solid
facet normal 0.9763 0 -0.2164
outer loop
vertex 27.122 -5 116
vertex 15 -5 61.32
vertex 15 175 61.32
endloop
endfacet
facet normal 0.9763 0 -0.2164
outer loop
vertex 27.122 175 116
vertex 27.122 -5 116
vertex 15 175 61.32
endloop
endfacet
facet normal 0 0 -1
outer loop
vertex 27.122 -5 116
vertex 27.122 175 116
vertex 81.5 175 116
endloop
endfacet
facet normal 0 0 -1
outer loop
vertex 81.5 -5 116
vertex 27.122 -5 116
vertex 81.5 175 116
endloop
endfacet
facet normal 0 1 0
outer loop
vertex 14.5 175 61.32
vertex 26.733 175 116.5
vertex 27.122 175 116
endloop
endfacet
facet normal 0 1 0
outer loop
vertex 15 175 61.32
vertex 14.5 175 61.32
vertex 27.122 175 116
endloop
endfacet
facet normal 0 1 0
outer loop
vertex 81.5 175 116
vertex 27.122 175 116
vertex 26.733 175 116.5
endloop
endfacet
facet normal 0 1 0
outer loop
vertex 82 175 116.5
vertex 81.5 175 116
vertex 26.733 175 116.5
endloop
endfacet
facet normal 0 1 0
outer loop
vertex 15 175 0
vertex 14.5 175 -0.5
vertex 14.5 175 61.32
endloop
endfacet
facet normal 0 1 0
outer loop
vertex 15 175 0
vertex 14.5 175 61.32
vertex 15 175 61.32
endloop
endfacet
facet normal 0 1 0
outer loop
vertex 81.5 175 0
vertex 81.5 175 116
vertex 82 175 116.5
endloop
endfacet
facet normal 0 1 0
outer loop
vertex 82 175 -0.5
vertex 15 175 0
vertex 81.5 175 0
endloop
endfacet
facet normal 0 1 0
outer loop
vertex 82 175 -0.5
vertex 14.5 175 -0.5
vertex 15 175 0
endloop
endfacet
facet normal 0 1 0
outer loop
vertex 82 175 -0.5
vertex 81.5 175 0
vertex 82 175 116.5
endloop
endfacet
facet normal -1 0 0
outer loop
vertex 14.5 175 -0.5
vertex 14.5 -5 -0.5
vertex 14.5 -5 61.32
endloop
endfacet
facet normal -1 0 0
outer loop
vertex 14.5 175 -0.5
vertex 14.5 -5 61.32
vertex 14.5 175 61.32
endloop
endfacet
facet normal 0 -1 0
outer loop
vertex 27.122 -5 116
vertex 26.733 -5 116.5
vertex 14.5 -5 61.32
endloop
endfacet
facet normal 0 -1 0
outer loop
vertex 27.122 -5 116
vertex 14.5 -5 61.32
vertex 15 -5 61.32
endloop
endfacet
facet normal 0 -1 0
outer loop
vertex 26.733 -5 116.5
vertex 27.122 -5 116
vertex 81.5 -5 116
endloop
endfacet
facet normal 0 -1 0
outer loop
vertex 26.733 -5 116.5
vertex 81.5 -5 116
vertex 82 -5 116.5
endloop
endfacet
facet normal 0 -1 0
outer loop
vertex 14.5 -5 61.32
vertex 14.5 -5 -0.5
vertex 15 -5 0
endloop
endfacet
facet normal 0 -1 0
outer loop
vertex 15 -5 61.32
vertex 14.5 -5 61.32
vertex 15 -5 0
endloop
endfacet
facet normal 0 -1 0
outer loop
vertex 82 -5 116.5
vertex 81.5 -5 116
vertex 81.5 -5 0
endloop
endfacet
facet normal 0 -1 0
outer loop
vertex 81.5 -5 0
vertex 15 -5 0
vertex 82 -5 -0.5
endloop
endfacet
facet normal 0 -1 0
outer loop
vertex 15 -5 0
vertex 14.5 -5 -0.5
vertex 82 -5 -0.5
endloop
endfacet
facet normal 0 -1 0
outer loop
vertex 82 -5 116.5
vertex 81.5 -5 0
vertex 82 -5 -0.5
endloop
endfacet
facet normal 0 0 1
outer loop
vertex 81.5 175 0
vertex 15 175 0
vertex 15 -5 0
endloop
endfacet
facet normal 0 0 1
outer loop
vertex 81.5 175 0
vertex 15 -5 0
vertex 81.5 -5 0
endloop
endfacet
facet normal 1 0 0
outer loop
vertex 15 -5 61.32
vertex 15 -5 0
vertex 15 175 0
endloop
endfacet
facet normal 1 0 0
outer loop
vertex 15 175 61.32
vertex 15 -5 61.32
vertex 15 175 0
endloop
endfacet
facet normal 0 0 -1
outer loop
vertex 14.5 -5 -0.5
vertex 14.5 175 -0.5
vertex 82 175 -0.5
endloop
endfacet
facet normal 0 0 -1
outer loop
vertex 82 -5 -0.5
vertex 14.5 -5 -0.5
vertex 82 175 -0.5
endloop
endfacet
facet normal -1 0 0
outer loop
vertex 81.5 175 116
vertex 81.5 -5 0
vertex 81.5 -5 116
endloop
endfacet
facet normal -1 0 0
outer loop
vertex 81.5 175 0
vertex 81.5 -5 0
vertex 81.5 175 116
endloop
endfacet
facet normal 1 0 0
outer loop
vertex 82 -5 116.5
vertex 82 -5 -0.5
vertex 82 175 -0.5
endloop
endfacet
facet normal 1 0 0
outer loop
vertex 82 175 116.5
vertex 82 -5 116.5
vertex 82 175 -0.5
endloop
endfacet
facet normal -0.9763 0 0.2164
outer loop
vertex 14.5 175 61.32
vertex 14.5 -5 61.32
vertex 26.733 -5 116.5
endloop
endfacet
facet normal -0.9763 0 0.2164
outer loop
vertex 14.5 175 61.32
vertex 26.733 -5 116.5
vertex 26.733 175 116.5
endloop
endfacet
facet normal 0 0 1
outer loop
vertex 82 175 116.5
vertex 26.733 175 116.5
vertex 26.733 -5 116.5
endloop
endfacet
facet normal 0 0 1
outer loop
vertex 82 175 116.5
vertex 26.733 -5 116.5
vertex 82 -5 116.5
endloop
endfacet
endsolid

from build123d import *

# Parameters (mm, degrees)
BOX014_W           = 67
BOX014_H           = 180
BOX014_DEPTH       = 116
BOX014_PITCH_ANGLE = 12.5
BOX012_W           = 66.5
BOX012_H           = 180
BOX012_DEPTH       = 116
BOX015_W           = 67
BOX015_H           = 180
BOX015_DEPTH       = 116
BOX015_PITCH_ANGLE = 12.5
BOX013_W           = 67.5
BOX013_H           = 180
BOX013_DEPTH       = 117


with BuildPart() as cube415:
    # Box014 → Box014 (new body)
    with BuildSketch(Plane.XY):
        with Locations((33.5, 90)):
            Rectangle(BOX014_W, BOX014_H)
    extrude(amount=BOX014_DEPTH)


with BuildPart() as cube415_1:
    # Box014 pitch: moved
    add(cube415.part.rotate(Axis((0, 0, 0), (0, 1, 0)), BOX014_PITCH_ANGLE))


with BuildPart() as cube415_2:
    # Box014 placement: moved
    add(cube415_1.part.moved(Location((-53.2, 0, 65))))


with BuildPart() as cut333:
    # Box012 → Box012 (new body)
    with BuildSketch(Plane(origin=(14.5, 0, -0.5), x_dir=(1, 0, 0), z_dir=(0, 0, 1))):
        with Locations((33.25, 90)):
            Rectangle(BOX012_W, BOX012_H)
    extrude(amount=BOX012_DEPTH)

    # Cut006: cut Cube415
    add(cube415_2.part, mode=Mode.SUBTRACT)


with BuildPart() as cut333_1:
    # Cut006 placement: moved
    add(cut333.part.moved(Location((0, -2, 0))))


with BuildPart() as cube417:
    # Box015 → Box015 (new body)
    with BuildSketch(Plane.XY):
        with Locations((33.5, 90)):
            Rectangle(BOX015_W, BOX015_H)
    extrude(amount=BOX015_DEPTH)


with BuildPart() as cube417_1:
    # Box015 pitch: moved
    add(cube417.part.rotate(Axis((0, 0, 0), (0, 1, 0)), BOX015_PITCH_ANGLE))


with BuildPart() as cube417_2:
    # Box015 placement: moved
    add(cube417_1.part.moved(Location((-53.7, 0, 65))))


with BuildPart() as cut008:
    # Box013 → Box013 (new body)
    with BuildSketch(Plane(origin=(14, 0, -1), x_dir=(1, 0, 0), z_dir=(0, 0, 1))):
        with Locations((33.75, 90)):
            Rectangle(BOX013_W, BOX013_H)
    extrude(amount=BOX013_DEPTH)

    # Cut005: cut Cube417
    add(cube417_2.part, mode=Mode.SUBTRACT)


with BuildPart() as cut008_1:
    # Cut005 placement: moved
    add(cut008.part.moved(Location((0, -2, 0))))

    # Cut008: cut Cut333
    add(cut333_1.part, mode=Mode.SUBTRACT)


with BuildPart() as cut008_2:
    # Cut008 placement: moved
    add(cut008_1.part.moved(Location((0.5, -3, 0.5))))


solid = cut008_2.part
